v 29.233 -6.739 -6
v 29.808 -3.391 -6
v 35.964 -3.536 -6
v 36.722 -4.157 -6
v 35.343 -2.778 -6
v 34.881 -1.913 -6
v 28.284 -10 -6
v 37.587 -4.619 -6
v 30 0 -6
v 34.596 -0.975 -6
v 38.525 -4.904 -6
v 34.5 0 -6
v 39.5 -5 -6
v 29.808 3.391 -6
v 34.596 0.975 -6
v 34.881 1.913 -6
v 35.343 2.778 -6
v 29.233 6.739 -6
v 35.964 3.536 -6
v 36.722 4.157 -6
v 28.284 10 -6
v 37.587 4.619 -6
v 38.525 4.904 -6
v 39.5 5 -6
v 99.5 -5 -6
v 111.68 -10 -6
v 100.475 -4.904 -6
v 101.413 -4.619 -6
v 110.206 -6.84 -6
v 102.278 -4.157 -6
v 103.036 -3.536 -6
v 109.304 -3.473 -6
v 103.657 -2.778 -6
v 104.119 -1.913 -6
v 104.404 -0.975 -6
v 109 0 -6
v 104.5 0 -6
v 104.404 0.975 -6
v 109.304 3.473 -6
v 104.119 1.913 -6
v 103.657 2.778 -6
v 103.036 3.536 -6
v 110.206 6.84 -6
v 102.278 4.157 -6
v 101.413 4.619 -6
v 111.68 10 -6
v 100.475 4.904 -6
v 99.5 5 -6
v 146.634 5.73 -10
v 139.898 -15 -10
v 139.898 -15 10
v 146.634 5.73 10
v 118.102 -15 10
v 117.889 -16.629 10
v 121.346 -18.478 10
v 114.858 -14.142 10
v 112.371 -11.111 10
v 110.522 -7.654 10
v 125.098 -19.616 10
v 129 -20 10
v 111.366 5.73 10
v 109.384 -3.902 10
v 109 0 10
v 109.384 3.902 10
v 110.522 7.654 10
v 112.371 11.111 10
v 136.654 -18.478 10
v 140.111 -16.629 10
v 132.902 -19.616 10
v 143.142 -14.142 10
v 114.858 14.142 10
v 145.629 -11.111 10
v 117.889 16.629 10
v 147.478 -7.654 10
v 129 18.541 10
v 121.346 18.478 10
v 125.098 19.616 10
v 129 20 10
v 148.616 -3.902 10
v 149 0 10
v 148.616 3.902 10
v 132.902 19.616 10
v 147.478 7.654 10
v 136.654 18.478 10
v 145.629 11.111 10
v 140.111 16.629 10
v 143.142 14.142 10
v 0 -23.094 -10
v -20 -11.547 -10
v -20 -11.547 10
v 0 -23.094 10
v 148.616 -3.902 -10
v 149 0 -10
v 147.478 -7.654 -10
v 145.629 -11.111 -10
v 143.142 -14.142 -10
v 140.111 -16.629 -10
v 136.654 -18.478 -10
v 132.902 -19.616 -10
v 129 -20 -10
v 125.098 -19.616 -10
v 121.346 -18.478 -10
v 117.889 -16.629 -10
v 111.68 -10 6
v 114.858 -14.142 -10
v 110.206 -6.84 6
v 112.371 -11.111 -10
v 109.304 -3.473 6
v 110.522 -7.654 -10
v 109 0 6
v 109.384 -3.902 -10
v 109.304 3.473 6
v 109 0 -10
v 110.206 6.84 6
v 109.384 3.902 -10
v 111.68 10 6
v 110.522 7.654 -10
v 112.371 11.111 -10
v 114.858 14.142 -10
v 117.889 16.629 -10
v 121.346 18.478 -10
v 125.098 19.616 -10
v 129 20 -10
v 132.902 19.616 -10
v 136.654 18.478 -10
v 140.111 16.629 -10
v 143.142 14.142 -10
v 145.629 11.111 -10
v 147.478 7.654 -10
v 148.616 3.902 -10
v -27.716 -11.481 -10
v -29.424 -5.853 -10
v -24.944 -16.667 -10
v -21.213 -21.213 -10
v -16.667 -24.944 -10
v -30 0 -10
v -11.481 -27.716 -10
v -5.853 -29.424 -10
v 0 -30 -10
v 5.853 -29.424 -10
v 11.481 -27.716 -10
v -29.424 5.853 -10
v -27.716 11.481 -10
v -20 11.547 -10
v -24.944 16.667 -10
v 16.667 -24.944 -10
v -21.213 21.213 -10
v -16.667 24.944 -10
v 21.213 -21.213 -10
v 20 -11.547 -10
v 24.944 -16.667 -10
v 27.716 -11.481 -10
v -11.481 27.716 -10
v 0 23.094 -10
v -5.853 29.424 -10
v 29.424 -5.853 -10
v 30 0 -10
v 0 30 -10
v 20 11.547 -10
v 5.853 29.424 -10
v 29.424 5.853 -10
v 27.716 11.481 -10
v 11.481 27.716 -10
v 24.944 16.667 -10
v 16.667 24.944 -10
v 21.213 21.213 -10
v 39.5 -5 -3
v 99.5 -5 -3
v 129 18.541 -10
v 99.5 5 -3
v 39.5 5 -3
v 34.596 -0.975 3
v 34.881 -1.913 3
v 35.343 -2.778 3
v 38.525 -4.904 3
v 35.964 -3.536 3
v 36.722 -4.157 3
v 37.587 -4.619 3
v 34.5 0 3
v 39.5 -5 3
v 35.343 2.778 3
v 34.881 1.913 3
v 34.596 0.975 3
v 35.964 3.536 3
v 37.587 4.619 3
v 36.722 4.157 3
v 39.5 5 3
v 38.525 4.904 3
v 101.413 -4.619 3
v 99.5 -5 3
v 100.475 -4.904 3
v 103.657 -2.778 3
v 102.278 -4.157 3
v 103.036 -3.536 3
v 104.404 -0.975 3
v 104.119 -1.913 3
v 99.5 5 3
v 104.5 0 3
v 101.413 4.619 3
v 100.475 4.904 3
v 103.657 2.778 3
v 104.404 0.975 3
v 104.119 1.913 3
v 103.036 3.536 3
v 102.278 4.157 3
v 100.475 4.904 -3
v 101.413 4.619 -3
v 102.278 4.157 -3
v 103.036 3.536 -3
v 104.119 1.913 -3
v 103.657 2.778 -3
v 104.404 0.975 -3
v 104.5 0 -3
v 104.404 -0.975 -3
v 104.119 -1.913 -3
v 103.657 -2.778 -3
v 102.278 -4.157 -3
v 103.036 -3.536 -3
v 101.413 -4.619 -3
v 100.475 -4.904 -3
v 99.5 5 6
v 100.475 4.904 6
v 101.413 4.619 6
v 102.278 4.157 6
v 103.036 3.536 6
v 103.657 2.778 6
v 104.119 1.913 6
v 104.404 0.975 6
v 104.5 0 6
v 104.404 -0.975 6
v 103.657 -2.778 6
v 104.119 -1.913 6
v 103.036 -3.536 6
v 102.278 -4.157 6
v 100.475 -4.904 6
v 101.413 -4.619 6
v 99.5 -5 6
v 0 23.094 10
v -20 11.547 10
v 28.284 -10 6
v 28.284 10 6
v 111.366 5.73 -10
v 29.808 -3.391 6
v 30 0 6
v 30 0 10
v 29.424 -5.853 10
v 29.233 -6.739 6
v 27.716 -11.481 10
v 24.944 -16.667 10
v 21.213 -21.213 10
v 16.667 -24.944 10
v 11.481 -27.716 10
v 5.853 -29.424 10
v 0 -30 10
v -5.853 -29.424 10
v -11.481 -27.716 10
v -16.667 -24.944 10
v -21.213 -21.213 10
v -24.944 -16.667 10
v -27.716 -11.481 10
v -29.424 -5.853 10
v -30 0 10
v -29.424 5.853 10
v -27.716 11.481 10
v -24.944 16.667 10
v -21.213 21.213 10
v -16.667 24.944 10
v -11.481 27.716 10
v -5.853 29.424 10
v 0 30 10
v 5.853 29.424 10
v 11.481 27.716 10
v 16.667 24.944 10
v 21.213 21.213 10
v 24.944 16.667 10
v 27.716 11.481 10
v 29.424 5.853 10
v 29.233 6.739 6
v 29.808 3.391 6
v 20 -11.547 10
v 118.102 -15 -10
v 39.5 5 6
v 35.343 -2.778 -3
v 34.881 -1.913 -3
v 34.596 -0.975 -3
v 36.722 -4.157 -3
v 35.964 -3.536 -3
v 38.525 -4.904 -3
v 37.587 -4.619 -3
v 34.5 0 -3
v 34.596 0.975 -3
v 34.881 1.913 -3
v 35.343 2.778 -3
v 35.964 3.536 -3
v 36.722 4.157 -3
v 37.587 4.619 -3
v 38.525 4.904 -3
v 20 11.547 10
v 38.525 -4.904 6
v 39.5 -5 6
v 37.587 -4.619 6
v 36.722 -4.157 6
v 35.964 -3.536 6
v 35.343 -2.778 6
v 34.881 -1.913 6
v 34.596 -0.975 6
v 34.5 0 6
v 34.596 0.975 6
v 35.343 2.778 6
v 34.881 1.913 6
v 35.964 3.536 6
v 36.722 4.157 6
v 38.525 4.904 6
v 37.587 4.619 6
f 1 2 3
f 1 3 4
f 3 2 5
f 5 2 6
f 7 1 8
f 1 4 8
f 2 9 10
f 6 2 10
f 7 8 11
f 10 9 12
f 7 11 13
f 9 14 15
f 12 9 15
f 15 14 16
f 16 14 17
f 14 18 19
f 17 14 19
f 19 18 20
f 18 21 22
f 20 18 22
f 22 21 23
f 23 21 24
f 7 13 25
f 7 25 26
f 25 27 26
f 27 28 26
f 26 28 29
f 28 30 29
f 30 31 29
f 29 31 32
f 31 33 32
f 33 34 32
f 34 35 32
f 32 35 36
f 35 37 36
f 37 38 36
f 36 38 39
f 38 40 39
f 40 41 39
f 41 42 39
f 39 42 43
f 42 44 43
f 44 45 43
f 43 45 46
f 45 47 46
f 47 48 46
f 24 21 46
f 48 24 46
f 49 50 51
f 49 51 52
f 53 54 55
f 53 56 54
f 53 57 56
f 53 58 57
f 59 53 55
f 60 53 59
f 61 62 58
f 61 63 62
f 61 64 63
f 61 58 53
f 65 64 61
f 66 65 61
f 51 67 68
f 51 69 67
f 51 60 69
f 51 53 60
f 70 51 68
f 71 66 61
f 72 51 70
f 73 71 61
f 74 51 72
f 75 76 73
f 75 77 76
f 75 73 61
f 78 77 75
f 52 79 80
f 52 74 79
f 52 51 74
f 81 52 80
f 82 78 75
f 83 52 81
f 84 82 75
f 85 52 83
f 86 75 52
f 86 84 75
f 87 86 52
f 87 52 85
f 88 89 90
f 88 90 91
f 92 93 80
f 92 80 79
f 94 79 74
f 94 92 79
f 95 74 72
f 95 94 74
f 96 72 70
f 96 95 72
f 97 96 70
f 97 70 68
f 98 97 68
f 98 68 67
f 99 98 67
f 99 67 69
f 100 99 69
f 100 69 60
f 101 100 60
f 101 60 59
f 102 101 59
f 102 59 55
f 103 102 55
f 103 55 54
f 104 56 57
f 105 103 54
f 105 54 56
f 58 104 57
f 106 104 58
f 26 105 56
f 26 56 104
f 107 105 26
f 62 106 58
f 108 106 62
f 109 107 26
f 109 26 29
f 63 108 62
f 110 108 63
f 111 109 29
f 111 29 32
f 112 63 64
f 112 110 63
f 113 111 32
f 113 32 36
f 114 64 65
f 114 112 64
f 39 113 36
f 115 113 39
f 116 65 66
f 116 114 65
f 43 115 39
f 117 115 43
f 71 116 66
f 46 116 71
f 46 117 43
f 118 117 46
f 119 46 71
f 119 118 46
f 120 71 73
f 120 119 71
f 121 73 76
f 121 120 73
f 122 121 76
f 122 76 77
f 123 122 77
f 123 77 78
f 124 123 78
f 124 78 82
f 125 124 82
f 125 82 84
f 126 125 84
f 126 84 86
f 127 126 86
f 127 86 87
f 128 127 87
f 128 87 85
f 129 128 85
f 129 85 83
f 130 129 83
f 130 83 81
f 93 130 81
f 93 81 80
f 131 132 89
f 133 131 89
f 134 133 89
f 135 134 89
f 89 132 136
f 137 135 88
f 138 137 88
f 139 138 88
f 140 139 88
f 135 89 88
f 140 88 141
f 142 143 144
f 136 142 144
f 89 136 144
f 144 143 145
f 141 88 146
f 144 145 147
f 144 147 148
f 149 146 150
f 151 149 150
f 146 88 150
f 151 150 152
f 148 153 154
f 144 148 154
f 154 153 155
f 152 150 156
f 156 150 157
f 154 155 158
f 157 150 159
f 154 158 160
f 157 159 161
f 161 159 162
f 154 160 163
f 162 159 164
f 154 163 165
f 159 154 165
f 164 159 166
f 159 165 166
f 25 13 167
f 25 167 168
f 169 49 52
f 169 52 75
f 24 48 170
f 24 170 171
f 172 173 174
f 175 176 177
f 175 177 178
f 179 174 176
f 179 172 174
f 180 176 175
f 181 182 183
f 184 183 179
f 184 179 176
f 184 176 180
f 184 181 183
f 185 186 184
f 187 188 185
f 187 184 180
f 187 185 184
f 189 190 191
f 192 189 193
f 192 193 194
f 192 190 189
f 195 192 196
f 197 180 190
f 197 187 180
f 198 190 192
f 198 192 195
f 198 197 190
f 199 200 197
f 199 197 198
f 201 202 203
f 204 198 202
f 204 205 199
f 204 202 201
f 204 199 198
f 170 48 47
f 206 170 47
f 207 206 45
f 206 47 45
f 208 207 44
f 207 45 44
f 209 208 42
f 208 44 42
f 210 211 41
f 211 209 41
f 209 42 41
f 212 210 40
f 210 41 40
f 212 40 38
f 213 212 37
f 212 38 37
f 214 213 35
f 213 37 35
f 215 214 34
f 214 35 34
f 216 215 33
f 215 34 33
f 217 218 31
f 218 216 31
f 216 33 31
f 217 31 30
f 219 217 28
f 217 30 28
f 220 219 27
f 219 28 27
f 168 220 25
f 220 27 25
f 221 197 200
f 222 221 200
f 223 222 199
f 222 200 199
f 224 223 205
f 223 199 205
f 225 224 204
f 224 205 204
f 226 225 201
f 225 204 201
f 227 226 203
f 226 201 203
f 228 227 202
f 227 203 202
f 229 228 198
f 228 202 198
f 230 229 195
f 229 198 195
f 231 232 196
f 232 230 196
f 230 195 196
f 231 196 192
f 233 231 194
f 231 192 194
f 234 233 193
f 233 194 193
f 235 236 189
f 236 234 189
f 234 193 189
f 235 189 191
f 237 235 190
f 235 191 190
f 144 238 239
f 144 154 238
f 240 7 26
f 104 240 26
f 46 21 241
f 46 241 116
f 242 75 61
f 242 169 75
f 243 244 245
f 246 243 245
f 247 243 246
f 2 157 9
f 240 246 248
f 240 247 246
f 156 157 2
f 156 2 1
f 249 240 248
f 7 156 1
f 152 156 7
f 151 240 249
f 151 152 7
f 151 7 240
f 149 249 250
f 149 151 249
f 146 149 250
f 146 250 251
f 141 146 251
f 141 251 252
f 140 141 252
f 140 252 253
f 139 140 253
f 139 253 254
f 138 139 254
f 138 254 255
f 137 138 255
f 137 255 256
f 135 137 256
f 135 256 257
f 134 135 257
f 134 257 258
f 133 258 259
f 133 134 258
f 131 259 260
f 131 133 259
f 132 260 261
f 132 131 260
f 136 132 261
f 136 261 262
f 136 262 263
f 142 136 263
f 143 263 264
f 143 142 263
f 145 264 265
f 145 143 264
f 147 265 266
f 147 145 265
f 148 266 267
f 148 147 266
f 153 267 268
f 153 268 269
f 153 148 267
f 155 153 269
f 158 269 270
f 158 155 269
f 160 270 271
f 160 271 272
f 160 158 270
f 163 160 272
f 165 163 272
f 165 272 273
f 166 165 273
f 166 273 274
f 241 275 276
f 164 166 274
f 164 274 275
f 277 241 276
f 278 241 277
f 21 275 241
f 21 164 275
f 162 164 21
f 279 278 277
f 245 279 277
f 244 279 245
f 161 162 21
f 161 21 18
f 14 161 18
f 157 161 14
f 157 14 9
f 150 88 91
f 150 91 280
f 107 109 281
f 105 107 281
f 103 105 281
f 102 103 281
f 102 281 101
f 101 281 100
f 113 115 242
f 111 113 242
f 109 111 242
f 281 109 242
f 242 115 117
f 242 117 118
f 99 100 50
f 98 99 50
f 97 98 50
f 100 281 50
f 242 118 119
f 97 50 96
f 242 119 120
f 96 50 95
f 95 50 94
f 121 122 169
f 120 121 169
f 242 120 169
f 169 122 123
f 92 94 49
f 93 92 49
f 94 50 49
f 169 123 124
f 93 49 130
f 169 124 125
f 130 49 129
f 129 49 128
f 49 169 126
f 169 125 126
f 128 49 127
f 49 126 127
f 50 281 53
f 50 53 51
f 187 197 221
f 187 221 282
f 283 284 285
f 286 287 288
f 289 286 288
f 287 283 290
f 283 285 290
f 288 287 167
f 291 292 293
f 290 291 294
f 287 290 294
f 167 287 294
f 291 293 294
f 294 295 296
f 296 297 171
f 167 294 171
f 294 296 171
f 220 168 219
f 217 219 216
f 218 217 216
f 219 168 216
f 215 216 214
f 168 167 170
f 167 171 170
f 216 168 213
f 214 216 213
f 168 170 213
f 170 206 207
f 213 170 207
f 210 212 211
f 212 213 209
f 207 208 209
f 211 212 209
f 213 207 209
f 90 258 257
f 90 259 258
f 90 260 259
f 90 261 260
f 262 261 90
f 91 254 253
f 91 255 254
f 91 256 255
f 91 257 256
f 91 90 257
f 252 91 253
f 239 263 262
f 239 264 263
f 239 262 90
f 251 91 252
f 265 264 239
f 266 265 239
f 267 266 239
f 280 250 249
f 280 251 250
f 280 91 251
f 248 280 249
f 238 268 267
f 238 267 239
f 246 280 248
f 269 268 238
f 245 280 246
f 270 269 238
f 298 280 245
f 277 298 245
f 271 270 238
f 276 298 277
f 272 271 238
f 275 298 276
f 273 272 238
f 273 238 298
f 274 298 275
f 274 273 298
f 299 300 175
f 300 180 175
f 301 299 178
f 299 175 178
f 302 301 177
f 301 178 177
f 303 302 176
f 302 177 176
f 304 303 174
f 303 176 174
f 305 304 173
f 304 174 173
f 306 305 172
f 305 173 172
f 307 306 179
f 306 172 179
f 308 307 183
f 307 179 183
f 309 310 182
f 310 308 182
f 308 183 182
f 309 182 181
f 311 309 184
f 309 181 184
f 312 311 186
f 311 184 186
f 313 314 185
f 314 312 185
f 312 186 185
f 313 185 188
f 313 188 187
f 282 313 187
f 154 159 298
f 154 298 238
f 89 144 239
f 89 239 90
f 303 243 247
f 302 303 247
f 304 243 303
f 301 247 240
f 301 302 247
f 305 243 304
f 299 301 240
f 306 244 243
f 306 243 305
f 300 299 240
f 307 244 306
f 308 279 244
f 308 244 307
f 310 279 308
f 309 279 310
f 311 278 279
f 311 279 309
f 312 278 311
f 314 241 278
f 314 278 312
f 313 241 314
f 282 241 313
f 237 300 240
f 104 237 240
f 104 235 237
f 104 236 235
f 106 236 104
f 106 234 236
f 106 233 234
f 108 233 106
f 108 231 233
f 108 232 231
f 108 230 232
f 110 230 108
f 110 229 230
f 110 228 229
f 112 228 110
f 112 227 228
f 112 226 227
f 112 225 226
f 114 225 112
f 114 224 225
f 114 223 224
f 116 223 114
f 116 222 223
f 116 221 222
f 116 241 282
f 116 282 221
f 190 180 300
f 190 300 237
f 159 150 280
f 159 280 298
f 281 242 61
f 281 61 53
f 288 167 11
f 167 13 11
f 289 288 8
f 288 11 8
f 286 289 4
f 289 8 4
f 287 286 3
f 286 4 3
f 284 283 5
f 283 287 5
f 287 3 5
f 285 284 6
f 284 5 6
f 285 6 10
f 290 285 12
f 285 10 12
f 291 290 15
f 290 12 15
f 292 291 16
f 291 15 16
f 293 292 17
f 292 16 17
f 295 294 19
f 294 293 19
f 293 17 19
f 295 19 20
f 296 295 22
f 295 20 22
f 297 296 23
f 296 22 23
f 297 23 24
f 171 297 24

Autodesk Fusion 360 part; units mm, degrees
sketch "Sketch1" plane through (0, 0, 0) normal (0, 0, 1) x (1, 0, 0)
  circle A0 centre (0, 0) radius 30
  circle A1 centre (129, 0) radius 20
  line L0 (0, 23.094) -> (-20, 11.547)
  line L1 (-20, 11.547) -> (-20, -11.547)
  line L2 (-20, -11.547) -> (0, -23.094)
  line L3 (0, -23.094) -> (20, -11.547)
  line L4 (20, -11.547) -> (20, 11.547)
  line L5 (20, 11.547) -> (0, 23.094)
  line L6 (146.6336, 5.7295) -> (129, 18.541)
  line L7 (129, 18.541) -> (111.3664, 5.7295)
  line L8 (111.3664, 5.7295) -> (118.1019, -15)
  line L9 (118.1019, -15) -> (139.8981, -15)
  line L10 (139.8981, -15) -> (146.6336, 5.7295)
  line L11 (28.2843, 10) -> (111.6795, 10)
  line L12 (28.2843, -10) -> (111.6795, -10)
  line L13 (99.5, 5) -> (39.5, 5)
  line L14 (39.5, -5) -> (99.5, -5)
  arc A2 (39.5, 5) -> (39.5, -5) centre (39.5, 0) ccw
  arc A3 (99.5, -5) -> (99.5, 5) centre (99.5, 0) ccw
  point P0 (129, 0)
  point P1 (69.5, 0)
  dimension "d2" = 129
  dimension "d4" = 20
  dimension "d5" = 60
  dimension "d6" = 15
  dimension "d7" = 40
  dimension "d8" = 60
  dimension "d9" = 10
  dimension "d11" = 10
  dimension "d12" = 20
extrude "Extrude1" add sketch "Sketch1" along normal mid plane 20 contours A0 | A1 makes body 1 at (148.9006, -1.9914, -3.3333) makes body 2 at (27.1662, -12.7278, 3.3333)
extrude "Extrude2" add sketch "Sketch1" along normal mid plane 12 contours A0 A1 L11 L12 bodies 1 2
extrude "Extrude3" add sketch "Sketch1" along normal mid plane 6 contours L13 L14 A2 A3 bodies 1
